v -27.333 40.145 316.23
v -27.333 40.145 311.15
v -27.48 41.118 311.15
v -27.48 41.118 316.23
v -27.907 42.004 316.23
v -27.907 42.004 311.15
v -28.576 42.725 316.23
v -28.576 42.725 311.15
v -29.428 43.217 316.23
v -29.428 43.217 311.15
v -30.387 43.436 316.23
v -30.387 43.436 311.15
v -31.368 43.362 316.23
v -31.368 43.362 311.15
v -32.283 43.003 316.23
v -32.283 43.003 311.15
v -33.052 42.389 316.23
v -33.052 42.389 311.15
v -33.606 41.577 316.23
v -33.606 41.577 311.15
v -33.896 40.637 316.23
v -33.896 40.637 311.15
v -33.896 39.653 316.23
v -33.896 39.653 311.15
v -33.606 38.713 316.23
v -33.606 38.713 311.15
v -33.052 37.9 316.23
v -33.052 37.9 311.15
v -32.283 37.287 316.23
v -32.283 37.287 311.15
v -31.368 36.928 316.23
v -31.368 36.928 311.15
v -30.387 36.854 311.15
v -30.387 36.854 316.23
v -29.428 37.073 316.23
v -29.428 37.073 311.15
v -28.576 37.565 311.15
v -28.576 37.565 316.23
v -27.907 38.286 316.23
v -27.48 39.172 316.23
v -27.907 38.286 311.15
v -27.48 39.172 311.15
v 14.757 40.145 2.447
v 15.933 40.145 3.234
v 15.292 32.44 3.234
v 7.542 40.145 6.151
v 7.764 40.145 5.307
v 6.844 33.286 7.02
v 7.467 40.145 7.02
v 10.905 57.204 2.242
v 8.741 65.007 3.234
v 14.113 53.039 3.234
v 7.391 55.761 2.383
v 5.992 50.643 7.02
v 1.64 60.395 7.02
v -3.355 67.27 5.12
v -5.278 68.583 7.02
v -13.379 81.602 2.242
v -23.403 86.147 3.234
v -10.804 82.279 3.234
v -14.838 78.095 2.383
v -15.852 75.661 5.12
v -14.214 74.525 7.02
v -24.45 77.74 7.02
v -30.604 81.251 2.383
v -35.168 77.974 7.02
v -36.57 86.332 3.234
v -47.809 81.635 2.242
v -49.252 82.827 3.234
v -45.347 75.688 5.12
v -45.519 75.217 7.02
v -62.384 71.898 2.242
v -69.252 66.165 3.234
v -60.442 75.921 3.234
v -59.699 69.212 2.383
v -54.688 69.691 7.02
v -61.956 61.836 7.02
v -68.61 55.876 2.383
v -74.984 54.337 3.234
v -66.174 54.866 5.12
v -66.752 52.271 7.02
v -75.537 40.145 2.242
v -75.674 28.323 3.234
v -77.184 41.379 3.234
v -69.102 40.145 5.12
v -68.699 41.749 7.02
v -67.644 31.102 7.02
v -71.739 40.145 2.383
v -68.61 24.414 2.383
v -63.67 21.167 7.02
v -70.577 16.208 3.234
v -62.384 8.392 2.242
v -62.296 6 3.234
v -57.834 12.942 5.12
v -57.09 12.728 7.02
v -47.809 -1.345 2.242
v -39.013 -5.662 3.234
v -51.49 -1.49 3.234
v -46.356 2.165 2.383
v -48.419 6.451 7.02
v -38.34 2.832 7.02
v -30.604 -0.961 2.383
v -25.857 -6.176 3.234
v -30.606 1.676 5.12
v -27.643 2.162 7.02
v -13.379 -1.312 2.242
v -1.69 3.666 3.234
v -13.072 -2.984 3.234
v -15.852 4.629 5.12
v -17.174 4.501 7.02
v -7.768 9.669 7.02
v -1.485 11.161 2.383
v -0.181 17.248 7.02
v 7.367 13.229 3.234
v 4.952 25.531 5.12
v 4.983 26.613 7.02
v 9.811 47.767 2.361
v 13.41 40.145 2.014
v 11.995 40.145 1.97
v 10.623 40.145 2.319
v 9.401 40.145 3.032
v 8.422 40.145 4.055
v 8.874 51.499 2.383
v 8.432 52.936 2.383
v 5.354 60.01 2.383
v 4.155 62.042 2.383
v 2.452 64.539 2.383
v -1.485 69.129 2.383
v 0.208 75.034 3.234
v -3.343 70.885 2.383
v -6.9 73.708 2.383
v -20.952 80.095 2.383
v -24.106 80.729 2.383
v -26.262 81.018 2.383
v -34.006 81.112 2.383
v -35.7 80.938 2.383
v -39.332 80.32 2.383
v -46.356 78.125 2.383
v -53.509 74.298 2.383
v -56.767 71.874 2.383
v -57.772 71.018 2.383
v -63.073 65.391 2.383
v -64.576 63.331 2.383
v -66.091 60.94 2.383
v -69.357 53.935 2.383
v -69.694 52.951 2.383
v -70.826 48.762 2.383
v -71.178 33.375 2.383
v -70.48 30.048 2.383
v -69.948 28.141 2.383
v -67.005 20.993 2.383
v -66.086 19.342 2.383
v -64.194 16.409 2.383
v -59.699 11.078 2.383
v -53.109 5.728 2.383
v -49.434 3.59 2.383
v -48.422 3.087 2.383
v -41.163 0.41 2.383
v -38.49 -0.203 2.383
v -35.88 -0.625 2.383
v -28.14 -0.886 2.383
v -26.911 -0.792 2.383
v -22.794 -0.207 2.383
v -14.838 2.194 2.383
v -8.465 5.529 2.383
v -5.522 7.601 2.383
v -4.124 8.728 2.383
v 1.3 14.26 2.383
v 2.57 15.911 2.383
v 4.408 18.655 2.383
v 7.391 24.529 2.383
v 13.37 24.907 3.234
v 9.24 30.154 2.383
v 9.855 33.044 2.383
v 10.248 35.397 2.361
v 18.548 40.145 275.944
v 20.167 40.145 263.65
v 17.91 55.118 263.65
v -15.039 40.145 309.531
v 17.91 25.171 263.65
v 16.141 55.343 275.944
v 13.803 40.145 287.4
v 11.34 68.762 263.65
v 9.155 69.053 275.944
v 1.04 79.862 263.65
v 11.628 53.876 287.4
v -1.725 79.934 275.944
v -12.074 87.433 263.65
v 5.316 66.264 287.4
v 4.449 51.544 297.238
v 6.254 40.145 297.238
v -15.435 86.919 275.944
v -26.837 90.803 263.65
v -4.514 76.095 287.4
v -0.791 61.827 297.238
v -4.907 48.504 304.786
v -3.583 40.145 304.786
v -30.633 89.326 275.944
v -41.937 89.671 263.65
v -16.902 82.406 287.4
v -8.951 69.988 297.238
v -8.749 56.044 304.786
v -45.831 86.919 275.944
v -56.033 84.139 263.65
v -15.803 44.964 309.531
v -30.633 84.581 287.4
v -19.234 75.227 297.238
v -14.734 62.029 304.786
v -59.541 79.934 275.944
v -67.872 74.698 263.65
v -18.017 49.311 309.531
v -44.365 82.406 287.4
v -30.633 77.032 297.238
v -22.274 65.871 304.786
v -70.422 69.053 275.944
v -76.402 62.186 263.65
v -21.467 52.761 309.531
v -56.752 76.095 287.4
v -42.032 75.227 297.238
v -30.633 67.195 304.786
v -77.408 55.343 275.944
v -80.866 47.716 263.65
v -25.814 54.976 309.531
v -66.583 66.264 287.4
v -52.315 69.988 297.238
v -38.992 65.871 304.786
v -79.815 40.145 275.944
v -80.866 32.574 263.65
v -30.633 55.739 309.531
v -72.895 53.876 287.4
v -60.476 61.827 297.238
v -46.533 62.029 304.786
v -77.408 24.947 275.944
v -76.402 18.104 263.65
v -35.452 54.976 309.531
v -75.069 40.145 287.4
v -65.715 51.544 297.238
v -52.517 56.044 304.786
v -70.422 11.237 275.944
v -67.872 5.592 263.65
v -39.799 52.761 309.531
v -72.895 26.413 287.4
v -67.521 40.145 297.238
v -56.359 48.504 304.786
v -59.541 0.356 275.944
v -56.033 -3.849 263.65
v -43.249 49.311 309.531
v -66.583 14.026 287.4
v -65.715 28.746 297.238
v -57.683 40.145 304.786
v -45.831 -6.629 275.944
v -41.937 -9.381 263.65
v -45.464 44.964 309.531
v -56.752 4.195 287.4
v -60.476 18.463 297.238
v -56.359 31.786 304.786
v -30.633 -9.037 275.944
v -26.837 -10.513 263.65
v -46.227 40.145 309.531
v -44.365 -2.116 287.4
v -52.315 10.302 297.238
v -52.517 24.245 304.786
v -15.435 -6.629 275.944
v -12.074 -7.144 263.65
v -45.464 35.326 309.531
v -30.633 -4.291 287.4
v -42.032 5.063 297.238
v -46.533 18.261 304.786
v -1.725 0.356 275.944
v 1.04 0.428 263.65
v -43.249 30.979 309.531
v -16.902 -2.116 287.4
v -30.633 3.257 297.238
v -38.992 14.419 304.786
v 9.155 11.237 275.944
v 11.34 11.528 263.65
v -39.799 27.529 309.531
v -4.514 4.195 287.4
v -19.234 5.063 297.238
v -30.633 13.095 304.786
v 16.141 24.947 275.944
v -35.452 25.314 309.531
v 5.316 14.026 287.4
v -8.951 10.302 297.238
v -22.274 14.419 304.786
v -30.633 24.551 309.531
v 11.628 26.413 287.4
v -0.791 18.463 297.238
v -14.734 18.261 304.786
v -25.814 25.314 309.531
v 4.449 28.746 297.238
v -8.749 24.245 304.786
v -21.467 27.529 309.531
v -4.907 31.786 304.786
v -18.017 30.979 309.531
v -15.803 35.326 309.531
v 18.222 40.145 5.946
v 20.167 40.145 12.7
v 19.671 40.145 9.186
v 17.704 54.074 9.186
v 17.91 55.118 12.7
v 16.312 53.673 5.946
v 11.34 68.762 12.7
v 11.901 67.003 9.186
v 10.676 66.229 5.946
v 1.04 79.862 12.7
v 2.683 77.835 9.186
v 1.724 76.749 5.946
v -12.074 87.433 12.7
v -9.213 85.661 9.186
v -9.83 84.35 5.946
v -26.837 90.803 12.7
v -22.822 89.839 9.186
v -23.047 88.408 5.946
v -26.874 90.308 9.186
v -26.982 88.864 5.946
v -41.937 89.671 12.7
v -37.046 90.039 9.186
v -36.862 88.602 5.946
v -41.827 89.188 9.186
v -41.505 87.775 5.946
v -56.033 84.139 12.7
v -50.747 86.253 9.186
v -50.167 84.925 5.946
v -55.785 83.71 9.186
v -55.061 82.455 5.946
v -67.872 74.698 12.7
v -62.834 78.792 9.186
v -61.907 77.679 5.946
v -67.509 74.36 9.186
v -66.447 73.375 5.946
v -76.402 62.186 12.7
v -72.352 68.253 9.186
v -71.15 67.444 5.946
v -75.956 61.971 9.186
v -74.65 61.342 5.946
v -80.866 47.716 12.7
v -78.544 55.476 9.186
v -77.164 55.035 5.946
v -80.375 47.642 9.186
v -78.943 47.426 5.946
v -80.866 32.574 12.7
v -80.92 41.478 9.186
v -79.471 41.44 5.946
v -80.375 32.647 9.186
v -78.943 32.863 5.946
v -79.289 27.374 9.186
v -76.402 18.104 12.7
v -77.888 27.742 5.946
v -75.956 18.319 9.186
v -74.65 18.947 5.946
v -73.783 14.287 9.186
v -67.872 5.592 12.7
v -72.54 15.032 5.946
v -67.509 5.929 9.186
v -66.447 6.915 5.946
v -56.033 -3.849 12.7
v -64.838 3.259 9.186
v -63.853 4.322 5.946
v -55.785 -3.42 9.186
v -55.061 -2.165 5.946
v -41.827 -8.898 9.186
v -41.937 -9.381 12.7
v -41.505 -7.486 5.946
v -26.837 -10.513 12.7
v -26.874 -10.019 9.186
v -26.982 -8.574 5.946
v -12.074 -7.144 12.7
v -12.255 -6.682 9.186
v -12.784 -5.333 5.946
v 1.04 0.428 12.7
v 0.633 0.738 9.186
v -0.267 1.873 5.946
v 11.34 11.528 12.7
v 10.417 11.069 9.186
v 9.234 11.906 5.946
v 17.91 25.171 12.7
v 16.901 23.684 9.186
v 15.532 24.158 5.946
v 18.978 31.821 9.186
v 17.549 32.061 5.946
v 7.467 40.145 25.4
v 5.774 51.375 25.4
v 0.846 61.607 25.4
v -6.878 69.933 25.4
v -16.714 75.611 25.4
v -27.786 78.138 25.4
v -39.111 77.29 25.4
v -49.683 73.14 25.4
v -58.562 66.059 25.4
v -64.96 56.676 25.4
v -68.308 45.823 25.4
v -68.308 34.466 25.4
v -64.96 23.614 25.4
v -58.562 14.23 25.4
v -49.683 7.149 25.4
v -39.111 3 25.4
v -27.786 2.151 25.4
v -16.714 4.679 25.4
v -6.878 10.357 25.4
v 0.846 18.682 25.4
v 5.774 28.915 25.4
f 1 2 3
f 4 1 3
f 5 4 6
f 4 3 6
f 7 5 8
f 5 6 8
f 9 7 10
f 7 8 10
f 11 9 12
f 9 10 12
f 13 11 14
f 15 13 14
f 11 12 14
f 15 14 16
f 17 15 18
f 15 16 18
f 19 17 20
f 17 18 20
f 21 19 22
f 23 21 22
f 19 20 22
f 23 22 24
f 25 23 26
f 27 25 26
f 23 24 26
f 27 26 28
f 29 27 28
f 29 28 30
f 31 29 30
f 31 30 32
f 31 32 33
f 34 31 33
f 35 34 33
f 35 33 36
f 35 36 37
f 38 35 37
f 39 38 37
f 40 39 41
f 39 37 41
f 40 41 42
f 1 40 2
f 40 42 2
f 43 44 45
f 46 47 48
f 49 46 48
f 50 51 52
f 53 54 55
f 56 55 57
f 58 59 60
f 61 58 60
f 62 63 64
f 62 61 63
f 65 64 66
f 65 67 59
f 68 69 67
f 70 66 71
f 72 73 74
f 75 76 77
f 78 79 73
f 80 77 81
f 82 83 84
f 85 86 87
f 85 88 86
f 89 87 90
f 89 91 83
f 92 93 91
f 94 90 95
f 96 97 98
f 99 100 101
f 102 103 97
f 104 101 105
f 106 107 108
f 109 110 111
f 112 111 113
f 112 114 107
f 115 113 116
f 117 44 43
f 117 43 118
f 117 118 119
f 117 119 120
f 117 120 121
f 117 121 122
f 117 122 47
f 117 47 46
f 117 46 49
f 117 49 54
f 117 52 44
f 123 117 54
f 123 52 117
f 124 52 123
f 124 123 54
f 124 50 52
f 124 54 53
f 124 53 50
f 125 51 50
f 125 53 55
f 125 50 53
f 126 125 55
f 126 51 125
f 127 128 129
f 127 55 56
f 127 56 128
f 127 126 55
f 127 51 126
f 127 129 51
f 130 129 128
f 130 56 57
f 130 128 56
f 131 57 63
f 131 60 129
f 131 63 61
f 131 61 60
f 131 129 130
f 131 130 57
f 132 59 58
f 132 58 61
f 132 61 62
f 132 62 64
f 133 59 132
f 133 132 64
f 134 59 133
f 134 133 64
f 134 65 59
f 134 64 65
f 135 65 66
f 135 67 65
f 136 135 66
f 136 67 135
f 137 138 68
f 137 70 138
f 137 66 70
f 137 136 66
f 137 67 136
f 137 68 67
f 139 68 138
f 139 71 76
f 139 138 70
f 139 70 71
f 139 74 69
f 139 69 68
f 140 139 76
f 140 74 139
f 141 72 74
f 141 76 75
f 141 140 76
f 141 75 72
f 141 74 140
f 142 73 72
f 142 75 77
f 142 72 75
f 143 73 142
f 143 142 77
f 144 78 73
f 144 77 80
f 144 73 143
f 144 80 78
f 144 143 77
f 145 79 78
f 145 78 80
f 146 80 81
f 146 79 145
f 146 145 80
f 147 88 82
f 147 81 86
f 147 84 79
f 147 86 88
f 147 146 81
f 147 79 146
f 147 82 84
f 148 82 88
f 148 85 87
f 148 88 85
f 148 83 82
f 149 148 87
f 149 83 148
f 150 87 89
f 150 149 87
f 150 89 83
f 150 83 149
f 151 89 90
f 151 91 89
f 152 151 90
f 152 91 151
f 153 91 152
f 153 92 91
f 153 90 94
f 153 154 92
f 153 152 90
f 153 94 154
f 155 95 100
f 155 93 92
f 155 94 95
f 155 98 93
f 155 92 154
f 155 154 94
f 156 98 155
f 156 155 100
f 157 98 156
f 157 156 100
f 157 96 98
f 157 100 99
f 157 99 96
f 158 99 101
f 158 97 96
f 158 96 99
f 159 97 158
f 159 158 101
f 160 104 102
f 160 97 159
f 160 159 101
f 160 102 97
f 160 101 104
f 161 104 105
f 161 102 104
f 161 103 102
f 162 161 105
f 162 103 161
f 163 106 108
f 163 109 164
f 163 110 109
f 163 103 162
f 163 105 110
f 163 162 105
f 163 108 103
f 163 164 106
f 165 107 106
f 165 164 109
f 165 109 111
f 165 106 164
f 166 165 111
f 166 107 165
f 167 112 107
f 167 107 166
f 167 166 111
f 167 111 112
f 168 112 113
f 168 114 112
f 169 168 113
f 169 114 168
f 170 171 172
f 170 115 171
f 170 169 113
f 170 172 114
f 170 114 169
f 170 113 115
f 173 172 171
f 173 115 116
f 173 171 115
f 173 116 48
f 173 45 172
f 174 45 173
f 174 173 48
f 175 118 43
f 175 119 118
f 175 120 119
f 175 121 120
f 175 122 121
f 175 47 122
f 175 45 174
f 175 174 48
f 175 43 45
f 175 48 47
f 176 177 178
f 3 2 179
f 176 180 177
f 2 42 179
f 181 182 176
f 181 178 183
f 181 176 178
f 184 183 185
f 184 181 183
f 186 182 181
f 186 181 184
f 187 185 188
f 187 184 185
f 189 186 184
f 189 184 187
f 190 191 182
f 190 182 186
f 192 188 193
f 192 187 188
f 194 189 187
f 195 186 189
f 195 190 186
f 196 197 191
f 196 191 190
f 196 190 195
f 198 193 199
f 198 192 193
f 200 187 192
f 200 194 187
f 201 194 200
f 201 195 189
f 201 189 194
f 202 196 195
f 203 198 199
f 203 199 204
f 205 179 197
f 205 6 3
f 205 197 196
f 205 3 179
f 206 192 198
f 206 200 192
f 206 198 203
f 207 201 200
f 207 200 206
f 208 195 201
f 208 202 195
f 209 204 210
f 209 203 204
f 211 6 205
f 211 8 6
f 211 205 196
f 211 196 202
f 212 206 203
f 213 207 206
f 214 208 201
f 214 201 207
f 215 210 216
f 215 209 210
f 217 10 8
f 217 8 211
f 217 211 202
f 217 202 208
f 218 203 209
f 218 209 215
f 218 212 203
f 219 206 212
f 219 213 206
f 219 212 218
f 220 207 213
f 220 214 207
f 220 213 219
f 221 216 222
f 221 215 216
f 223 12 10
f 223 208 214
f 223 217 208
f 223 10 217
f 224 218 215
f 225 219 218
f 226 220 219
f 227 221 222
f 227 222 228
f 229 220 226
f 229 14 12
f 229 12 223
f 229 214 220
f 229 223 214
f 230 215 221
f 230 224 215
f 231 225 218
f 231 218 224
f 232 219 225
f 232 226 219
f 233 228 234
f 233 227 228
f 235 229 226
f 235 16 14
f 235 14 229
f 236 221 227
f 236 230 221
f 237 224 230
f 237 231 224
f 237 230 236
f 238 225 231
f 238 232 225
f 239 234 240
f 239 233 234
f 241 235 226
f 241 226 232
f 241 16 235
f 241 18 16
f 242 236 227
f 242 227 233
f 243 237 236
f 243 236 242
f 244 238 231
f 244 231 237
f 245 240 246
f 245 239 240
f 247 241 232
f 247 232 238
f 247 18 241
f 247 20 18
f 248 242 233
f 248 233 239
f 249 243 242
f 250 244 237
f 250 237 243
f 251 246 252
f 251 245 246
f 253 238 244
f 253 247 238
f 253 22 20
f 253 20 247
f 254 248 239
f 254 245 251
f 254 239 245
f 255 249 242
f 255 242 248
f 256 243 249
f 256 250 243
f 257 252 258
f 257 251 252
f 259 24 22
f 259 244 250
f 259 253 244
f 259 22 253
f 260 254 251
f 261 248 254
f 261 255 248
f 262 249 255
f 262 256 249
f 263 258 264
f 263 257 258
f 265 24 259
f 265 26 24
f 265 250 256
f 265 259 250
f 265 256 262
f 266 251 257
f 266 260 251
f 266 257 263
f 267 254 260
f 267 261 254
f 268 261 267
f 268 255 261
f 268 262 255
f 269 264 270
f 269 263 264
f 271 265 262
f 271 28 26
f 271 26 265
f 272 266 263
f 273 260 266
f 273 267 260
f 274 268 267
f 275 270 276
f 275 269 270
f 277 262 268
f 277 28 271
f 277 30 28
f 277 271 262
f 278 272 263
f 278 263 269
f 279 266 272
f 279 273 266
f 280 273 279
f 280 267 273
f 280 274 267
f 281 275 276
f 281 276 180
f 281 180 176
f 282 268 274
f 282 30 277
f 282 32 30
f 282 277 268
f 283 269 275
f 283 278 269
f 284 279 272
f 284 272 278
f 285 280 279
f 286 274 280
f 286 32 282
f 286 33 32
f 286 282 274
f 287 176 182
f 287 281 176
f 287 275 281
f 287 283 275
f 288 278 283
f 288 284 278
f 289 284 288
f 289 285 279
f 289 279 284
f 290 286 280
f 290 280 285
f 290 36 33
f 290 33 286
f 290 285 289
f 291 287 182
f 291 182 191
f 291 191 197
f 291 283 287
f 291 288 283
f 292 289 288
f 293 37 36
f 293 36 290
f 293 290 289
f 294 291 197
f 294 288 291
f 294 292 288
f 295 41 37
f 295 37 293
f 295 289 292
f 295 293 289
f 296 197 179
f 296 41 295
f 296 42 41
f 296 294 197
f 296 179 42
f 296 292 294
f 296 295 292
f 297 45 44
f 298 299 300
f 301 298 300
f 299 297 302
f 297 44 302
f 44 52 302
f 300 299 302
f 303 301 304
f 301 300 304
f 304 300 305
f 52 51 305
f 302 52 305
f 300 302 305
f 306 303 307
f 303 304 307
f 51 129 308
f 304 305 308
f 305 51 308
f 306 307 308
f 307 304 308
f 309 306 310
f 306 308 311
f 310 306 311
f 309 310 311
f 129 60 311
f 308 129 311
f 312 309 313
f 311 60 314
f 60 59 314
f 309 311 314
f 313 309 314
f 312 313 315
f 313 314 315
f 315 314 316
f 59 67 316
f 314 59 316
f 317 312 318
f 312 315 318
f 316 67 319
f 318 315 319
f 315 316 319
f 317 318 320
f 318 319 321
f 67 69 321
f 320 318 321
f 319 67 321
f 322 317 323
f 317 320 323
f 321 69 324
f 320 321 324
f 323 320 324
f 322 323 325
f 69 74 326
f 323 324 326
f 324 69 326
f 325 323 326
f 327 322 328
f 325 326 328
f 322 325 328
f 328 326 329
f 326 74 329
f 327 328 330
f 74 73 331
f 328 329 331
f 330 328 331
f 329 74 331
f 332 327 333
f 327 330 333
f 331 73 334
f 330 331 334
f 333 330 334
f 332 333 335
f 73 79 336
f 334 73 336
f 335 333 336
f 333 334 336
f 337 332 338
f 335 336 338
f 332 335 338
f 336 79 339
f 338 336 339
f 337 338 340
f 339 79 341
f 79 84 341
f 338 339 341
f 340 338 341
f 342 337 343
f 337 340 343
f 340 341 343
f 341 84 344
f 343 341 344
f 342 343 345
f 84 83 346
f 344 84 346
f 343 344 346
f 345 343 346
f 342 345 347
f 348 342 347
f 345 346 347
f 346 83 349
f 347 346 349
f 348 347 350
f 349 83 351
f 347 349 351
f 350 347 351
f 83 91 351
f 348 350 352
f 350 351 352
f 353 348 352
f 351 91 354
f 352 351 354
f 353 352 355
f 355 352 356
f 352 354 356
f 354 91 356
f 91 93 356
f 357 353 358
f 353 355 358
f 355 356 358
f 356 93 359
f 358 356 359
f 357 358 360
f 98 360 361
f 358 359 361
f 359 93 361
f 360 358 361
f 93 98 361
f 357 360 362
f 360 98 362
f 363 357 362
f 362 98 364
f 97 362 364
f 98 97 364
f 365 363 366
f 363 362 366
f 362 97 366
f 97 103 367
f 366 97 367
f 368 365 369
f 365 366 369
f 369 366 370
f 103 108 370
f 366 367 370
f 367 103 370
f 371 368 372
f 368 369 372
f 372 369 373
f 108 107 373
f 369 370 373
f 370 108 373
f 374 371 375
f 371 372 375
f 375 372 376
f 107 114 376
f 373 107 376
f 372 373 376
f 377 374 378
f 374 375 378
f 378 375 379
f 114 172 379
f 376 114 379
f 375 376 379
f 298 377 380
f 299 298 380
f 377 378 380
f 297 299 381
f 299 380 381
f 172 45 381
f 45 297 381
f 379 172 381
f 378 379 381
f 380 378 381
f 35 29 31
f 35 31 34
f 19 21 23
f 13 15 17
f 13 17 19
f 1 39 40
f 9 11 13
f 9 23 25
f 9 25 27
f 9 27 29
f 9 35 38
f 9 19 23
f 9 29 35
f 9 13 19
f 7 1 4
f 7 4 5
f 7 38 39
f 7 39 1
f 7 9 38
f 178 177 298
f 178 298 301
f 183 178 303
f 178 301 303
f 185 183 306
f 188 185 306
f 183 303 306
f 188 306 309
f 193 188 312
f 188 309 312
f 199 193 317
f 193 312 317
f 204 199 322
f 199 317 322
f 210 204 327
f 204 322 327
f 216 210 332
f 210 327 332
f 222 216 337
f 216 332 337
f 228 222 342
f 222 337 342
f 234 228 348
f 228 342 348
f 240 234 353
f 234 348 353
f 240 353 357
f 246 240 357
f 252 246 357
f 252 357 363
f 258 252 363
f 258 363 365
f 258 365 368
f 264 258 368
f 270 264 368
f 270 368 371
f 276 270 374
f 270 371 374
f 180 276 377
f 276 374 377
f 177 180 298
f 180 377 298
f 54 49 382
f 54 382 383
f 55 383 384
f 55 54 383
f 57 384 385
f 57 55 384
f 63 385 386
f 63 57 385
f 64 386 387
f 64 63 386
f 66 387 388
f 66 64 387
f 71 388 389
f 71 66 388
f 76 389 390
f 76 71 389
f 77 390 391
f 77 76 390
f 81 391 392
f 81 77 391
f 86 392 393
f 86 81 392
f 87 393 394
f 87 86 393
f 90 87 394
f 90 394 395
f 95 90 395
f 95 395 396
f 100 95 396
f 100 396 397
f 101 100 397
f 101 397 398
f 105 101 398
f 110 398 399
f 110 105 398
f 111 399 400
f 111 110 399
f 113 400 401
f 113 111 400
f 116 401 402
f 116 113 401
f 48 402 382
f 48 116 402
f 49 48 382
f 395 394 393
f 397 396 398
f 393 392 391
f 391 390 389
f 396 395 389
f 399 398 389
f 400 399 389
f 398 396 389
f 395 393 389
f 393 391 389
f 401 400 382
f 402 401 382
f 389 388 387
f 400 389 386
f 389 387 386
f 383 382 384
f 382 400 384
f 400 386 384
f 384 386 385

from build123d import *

# Parameters (mm, degrees)
F0_R     = 50.8
F1_DEPTH = 311.15
F2_R     = 47.5000066
F3_DEPTH = 5.08
F4_R     = 12.7
F5_DEPTH = 25.4
F6_R     = 5.08


with BuildPart() as f1:
    # F0 (on Top) → F1 (new body)
    with BuildSketch(Plane.XY):
        with Locations((-30.63319996, 40.1448793709)):
            Circle(F0_R)
    extrude(amount=F1_DEPTH)

    # F2
    f2_edges = [f1.edges().sort_by_distance(p)[0] for p in [
        (-81.4332, 40.144879, 311.15),
    ]]
    fillet(f2_edges, radius=F2_R)

    # F3 (add): a face of the model
    f3_faces = [f1.faces().sort_by_distance(p)[0] for p in [
        (-30.63319996, 40.1448793709, 311.15),
    ]]
    extrude(f3_faces, amount=F3_DEPTH)

    # F4
    f4_edges = [f1.edges().sort_by_distance(p)[0] for p in [
        (-81.4332, 40.144879, 0),
    ]]
    fillet(f4_edges, radius=F4_R)

    # F5 (cut): a face of the model
    f5_faces = [f1.faces().sort_by_distance(p)[0] for p in [
        (-30.63319996, 40.1448793709, 0),
    ]]
    extrude(f5_faces, amount=-F5_DEPTH, mode=Mode.SUBTRACT)

    # F6
    f6_edges = [f1.edges().sort_by_distance(p)[0] for p in [
        (-68.7332, 40.144879, 0),
    ]]
    fillet(f6_edges, radius=F6_R)


solid = f1.part
